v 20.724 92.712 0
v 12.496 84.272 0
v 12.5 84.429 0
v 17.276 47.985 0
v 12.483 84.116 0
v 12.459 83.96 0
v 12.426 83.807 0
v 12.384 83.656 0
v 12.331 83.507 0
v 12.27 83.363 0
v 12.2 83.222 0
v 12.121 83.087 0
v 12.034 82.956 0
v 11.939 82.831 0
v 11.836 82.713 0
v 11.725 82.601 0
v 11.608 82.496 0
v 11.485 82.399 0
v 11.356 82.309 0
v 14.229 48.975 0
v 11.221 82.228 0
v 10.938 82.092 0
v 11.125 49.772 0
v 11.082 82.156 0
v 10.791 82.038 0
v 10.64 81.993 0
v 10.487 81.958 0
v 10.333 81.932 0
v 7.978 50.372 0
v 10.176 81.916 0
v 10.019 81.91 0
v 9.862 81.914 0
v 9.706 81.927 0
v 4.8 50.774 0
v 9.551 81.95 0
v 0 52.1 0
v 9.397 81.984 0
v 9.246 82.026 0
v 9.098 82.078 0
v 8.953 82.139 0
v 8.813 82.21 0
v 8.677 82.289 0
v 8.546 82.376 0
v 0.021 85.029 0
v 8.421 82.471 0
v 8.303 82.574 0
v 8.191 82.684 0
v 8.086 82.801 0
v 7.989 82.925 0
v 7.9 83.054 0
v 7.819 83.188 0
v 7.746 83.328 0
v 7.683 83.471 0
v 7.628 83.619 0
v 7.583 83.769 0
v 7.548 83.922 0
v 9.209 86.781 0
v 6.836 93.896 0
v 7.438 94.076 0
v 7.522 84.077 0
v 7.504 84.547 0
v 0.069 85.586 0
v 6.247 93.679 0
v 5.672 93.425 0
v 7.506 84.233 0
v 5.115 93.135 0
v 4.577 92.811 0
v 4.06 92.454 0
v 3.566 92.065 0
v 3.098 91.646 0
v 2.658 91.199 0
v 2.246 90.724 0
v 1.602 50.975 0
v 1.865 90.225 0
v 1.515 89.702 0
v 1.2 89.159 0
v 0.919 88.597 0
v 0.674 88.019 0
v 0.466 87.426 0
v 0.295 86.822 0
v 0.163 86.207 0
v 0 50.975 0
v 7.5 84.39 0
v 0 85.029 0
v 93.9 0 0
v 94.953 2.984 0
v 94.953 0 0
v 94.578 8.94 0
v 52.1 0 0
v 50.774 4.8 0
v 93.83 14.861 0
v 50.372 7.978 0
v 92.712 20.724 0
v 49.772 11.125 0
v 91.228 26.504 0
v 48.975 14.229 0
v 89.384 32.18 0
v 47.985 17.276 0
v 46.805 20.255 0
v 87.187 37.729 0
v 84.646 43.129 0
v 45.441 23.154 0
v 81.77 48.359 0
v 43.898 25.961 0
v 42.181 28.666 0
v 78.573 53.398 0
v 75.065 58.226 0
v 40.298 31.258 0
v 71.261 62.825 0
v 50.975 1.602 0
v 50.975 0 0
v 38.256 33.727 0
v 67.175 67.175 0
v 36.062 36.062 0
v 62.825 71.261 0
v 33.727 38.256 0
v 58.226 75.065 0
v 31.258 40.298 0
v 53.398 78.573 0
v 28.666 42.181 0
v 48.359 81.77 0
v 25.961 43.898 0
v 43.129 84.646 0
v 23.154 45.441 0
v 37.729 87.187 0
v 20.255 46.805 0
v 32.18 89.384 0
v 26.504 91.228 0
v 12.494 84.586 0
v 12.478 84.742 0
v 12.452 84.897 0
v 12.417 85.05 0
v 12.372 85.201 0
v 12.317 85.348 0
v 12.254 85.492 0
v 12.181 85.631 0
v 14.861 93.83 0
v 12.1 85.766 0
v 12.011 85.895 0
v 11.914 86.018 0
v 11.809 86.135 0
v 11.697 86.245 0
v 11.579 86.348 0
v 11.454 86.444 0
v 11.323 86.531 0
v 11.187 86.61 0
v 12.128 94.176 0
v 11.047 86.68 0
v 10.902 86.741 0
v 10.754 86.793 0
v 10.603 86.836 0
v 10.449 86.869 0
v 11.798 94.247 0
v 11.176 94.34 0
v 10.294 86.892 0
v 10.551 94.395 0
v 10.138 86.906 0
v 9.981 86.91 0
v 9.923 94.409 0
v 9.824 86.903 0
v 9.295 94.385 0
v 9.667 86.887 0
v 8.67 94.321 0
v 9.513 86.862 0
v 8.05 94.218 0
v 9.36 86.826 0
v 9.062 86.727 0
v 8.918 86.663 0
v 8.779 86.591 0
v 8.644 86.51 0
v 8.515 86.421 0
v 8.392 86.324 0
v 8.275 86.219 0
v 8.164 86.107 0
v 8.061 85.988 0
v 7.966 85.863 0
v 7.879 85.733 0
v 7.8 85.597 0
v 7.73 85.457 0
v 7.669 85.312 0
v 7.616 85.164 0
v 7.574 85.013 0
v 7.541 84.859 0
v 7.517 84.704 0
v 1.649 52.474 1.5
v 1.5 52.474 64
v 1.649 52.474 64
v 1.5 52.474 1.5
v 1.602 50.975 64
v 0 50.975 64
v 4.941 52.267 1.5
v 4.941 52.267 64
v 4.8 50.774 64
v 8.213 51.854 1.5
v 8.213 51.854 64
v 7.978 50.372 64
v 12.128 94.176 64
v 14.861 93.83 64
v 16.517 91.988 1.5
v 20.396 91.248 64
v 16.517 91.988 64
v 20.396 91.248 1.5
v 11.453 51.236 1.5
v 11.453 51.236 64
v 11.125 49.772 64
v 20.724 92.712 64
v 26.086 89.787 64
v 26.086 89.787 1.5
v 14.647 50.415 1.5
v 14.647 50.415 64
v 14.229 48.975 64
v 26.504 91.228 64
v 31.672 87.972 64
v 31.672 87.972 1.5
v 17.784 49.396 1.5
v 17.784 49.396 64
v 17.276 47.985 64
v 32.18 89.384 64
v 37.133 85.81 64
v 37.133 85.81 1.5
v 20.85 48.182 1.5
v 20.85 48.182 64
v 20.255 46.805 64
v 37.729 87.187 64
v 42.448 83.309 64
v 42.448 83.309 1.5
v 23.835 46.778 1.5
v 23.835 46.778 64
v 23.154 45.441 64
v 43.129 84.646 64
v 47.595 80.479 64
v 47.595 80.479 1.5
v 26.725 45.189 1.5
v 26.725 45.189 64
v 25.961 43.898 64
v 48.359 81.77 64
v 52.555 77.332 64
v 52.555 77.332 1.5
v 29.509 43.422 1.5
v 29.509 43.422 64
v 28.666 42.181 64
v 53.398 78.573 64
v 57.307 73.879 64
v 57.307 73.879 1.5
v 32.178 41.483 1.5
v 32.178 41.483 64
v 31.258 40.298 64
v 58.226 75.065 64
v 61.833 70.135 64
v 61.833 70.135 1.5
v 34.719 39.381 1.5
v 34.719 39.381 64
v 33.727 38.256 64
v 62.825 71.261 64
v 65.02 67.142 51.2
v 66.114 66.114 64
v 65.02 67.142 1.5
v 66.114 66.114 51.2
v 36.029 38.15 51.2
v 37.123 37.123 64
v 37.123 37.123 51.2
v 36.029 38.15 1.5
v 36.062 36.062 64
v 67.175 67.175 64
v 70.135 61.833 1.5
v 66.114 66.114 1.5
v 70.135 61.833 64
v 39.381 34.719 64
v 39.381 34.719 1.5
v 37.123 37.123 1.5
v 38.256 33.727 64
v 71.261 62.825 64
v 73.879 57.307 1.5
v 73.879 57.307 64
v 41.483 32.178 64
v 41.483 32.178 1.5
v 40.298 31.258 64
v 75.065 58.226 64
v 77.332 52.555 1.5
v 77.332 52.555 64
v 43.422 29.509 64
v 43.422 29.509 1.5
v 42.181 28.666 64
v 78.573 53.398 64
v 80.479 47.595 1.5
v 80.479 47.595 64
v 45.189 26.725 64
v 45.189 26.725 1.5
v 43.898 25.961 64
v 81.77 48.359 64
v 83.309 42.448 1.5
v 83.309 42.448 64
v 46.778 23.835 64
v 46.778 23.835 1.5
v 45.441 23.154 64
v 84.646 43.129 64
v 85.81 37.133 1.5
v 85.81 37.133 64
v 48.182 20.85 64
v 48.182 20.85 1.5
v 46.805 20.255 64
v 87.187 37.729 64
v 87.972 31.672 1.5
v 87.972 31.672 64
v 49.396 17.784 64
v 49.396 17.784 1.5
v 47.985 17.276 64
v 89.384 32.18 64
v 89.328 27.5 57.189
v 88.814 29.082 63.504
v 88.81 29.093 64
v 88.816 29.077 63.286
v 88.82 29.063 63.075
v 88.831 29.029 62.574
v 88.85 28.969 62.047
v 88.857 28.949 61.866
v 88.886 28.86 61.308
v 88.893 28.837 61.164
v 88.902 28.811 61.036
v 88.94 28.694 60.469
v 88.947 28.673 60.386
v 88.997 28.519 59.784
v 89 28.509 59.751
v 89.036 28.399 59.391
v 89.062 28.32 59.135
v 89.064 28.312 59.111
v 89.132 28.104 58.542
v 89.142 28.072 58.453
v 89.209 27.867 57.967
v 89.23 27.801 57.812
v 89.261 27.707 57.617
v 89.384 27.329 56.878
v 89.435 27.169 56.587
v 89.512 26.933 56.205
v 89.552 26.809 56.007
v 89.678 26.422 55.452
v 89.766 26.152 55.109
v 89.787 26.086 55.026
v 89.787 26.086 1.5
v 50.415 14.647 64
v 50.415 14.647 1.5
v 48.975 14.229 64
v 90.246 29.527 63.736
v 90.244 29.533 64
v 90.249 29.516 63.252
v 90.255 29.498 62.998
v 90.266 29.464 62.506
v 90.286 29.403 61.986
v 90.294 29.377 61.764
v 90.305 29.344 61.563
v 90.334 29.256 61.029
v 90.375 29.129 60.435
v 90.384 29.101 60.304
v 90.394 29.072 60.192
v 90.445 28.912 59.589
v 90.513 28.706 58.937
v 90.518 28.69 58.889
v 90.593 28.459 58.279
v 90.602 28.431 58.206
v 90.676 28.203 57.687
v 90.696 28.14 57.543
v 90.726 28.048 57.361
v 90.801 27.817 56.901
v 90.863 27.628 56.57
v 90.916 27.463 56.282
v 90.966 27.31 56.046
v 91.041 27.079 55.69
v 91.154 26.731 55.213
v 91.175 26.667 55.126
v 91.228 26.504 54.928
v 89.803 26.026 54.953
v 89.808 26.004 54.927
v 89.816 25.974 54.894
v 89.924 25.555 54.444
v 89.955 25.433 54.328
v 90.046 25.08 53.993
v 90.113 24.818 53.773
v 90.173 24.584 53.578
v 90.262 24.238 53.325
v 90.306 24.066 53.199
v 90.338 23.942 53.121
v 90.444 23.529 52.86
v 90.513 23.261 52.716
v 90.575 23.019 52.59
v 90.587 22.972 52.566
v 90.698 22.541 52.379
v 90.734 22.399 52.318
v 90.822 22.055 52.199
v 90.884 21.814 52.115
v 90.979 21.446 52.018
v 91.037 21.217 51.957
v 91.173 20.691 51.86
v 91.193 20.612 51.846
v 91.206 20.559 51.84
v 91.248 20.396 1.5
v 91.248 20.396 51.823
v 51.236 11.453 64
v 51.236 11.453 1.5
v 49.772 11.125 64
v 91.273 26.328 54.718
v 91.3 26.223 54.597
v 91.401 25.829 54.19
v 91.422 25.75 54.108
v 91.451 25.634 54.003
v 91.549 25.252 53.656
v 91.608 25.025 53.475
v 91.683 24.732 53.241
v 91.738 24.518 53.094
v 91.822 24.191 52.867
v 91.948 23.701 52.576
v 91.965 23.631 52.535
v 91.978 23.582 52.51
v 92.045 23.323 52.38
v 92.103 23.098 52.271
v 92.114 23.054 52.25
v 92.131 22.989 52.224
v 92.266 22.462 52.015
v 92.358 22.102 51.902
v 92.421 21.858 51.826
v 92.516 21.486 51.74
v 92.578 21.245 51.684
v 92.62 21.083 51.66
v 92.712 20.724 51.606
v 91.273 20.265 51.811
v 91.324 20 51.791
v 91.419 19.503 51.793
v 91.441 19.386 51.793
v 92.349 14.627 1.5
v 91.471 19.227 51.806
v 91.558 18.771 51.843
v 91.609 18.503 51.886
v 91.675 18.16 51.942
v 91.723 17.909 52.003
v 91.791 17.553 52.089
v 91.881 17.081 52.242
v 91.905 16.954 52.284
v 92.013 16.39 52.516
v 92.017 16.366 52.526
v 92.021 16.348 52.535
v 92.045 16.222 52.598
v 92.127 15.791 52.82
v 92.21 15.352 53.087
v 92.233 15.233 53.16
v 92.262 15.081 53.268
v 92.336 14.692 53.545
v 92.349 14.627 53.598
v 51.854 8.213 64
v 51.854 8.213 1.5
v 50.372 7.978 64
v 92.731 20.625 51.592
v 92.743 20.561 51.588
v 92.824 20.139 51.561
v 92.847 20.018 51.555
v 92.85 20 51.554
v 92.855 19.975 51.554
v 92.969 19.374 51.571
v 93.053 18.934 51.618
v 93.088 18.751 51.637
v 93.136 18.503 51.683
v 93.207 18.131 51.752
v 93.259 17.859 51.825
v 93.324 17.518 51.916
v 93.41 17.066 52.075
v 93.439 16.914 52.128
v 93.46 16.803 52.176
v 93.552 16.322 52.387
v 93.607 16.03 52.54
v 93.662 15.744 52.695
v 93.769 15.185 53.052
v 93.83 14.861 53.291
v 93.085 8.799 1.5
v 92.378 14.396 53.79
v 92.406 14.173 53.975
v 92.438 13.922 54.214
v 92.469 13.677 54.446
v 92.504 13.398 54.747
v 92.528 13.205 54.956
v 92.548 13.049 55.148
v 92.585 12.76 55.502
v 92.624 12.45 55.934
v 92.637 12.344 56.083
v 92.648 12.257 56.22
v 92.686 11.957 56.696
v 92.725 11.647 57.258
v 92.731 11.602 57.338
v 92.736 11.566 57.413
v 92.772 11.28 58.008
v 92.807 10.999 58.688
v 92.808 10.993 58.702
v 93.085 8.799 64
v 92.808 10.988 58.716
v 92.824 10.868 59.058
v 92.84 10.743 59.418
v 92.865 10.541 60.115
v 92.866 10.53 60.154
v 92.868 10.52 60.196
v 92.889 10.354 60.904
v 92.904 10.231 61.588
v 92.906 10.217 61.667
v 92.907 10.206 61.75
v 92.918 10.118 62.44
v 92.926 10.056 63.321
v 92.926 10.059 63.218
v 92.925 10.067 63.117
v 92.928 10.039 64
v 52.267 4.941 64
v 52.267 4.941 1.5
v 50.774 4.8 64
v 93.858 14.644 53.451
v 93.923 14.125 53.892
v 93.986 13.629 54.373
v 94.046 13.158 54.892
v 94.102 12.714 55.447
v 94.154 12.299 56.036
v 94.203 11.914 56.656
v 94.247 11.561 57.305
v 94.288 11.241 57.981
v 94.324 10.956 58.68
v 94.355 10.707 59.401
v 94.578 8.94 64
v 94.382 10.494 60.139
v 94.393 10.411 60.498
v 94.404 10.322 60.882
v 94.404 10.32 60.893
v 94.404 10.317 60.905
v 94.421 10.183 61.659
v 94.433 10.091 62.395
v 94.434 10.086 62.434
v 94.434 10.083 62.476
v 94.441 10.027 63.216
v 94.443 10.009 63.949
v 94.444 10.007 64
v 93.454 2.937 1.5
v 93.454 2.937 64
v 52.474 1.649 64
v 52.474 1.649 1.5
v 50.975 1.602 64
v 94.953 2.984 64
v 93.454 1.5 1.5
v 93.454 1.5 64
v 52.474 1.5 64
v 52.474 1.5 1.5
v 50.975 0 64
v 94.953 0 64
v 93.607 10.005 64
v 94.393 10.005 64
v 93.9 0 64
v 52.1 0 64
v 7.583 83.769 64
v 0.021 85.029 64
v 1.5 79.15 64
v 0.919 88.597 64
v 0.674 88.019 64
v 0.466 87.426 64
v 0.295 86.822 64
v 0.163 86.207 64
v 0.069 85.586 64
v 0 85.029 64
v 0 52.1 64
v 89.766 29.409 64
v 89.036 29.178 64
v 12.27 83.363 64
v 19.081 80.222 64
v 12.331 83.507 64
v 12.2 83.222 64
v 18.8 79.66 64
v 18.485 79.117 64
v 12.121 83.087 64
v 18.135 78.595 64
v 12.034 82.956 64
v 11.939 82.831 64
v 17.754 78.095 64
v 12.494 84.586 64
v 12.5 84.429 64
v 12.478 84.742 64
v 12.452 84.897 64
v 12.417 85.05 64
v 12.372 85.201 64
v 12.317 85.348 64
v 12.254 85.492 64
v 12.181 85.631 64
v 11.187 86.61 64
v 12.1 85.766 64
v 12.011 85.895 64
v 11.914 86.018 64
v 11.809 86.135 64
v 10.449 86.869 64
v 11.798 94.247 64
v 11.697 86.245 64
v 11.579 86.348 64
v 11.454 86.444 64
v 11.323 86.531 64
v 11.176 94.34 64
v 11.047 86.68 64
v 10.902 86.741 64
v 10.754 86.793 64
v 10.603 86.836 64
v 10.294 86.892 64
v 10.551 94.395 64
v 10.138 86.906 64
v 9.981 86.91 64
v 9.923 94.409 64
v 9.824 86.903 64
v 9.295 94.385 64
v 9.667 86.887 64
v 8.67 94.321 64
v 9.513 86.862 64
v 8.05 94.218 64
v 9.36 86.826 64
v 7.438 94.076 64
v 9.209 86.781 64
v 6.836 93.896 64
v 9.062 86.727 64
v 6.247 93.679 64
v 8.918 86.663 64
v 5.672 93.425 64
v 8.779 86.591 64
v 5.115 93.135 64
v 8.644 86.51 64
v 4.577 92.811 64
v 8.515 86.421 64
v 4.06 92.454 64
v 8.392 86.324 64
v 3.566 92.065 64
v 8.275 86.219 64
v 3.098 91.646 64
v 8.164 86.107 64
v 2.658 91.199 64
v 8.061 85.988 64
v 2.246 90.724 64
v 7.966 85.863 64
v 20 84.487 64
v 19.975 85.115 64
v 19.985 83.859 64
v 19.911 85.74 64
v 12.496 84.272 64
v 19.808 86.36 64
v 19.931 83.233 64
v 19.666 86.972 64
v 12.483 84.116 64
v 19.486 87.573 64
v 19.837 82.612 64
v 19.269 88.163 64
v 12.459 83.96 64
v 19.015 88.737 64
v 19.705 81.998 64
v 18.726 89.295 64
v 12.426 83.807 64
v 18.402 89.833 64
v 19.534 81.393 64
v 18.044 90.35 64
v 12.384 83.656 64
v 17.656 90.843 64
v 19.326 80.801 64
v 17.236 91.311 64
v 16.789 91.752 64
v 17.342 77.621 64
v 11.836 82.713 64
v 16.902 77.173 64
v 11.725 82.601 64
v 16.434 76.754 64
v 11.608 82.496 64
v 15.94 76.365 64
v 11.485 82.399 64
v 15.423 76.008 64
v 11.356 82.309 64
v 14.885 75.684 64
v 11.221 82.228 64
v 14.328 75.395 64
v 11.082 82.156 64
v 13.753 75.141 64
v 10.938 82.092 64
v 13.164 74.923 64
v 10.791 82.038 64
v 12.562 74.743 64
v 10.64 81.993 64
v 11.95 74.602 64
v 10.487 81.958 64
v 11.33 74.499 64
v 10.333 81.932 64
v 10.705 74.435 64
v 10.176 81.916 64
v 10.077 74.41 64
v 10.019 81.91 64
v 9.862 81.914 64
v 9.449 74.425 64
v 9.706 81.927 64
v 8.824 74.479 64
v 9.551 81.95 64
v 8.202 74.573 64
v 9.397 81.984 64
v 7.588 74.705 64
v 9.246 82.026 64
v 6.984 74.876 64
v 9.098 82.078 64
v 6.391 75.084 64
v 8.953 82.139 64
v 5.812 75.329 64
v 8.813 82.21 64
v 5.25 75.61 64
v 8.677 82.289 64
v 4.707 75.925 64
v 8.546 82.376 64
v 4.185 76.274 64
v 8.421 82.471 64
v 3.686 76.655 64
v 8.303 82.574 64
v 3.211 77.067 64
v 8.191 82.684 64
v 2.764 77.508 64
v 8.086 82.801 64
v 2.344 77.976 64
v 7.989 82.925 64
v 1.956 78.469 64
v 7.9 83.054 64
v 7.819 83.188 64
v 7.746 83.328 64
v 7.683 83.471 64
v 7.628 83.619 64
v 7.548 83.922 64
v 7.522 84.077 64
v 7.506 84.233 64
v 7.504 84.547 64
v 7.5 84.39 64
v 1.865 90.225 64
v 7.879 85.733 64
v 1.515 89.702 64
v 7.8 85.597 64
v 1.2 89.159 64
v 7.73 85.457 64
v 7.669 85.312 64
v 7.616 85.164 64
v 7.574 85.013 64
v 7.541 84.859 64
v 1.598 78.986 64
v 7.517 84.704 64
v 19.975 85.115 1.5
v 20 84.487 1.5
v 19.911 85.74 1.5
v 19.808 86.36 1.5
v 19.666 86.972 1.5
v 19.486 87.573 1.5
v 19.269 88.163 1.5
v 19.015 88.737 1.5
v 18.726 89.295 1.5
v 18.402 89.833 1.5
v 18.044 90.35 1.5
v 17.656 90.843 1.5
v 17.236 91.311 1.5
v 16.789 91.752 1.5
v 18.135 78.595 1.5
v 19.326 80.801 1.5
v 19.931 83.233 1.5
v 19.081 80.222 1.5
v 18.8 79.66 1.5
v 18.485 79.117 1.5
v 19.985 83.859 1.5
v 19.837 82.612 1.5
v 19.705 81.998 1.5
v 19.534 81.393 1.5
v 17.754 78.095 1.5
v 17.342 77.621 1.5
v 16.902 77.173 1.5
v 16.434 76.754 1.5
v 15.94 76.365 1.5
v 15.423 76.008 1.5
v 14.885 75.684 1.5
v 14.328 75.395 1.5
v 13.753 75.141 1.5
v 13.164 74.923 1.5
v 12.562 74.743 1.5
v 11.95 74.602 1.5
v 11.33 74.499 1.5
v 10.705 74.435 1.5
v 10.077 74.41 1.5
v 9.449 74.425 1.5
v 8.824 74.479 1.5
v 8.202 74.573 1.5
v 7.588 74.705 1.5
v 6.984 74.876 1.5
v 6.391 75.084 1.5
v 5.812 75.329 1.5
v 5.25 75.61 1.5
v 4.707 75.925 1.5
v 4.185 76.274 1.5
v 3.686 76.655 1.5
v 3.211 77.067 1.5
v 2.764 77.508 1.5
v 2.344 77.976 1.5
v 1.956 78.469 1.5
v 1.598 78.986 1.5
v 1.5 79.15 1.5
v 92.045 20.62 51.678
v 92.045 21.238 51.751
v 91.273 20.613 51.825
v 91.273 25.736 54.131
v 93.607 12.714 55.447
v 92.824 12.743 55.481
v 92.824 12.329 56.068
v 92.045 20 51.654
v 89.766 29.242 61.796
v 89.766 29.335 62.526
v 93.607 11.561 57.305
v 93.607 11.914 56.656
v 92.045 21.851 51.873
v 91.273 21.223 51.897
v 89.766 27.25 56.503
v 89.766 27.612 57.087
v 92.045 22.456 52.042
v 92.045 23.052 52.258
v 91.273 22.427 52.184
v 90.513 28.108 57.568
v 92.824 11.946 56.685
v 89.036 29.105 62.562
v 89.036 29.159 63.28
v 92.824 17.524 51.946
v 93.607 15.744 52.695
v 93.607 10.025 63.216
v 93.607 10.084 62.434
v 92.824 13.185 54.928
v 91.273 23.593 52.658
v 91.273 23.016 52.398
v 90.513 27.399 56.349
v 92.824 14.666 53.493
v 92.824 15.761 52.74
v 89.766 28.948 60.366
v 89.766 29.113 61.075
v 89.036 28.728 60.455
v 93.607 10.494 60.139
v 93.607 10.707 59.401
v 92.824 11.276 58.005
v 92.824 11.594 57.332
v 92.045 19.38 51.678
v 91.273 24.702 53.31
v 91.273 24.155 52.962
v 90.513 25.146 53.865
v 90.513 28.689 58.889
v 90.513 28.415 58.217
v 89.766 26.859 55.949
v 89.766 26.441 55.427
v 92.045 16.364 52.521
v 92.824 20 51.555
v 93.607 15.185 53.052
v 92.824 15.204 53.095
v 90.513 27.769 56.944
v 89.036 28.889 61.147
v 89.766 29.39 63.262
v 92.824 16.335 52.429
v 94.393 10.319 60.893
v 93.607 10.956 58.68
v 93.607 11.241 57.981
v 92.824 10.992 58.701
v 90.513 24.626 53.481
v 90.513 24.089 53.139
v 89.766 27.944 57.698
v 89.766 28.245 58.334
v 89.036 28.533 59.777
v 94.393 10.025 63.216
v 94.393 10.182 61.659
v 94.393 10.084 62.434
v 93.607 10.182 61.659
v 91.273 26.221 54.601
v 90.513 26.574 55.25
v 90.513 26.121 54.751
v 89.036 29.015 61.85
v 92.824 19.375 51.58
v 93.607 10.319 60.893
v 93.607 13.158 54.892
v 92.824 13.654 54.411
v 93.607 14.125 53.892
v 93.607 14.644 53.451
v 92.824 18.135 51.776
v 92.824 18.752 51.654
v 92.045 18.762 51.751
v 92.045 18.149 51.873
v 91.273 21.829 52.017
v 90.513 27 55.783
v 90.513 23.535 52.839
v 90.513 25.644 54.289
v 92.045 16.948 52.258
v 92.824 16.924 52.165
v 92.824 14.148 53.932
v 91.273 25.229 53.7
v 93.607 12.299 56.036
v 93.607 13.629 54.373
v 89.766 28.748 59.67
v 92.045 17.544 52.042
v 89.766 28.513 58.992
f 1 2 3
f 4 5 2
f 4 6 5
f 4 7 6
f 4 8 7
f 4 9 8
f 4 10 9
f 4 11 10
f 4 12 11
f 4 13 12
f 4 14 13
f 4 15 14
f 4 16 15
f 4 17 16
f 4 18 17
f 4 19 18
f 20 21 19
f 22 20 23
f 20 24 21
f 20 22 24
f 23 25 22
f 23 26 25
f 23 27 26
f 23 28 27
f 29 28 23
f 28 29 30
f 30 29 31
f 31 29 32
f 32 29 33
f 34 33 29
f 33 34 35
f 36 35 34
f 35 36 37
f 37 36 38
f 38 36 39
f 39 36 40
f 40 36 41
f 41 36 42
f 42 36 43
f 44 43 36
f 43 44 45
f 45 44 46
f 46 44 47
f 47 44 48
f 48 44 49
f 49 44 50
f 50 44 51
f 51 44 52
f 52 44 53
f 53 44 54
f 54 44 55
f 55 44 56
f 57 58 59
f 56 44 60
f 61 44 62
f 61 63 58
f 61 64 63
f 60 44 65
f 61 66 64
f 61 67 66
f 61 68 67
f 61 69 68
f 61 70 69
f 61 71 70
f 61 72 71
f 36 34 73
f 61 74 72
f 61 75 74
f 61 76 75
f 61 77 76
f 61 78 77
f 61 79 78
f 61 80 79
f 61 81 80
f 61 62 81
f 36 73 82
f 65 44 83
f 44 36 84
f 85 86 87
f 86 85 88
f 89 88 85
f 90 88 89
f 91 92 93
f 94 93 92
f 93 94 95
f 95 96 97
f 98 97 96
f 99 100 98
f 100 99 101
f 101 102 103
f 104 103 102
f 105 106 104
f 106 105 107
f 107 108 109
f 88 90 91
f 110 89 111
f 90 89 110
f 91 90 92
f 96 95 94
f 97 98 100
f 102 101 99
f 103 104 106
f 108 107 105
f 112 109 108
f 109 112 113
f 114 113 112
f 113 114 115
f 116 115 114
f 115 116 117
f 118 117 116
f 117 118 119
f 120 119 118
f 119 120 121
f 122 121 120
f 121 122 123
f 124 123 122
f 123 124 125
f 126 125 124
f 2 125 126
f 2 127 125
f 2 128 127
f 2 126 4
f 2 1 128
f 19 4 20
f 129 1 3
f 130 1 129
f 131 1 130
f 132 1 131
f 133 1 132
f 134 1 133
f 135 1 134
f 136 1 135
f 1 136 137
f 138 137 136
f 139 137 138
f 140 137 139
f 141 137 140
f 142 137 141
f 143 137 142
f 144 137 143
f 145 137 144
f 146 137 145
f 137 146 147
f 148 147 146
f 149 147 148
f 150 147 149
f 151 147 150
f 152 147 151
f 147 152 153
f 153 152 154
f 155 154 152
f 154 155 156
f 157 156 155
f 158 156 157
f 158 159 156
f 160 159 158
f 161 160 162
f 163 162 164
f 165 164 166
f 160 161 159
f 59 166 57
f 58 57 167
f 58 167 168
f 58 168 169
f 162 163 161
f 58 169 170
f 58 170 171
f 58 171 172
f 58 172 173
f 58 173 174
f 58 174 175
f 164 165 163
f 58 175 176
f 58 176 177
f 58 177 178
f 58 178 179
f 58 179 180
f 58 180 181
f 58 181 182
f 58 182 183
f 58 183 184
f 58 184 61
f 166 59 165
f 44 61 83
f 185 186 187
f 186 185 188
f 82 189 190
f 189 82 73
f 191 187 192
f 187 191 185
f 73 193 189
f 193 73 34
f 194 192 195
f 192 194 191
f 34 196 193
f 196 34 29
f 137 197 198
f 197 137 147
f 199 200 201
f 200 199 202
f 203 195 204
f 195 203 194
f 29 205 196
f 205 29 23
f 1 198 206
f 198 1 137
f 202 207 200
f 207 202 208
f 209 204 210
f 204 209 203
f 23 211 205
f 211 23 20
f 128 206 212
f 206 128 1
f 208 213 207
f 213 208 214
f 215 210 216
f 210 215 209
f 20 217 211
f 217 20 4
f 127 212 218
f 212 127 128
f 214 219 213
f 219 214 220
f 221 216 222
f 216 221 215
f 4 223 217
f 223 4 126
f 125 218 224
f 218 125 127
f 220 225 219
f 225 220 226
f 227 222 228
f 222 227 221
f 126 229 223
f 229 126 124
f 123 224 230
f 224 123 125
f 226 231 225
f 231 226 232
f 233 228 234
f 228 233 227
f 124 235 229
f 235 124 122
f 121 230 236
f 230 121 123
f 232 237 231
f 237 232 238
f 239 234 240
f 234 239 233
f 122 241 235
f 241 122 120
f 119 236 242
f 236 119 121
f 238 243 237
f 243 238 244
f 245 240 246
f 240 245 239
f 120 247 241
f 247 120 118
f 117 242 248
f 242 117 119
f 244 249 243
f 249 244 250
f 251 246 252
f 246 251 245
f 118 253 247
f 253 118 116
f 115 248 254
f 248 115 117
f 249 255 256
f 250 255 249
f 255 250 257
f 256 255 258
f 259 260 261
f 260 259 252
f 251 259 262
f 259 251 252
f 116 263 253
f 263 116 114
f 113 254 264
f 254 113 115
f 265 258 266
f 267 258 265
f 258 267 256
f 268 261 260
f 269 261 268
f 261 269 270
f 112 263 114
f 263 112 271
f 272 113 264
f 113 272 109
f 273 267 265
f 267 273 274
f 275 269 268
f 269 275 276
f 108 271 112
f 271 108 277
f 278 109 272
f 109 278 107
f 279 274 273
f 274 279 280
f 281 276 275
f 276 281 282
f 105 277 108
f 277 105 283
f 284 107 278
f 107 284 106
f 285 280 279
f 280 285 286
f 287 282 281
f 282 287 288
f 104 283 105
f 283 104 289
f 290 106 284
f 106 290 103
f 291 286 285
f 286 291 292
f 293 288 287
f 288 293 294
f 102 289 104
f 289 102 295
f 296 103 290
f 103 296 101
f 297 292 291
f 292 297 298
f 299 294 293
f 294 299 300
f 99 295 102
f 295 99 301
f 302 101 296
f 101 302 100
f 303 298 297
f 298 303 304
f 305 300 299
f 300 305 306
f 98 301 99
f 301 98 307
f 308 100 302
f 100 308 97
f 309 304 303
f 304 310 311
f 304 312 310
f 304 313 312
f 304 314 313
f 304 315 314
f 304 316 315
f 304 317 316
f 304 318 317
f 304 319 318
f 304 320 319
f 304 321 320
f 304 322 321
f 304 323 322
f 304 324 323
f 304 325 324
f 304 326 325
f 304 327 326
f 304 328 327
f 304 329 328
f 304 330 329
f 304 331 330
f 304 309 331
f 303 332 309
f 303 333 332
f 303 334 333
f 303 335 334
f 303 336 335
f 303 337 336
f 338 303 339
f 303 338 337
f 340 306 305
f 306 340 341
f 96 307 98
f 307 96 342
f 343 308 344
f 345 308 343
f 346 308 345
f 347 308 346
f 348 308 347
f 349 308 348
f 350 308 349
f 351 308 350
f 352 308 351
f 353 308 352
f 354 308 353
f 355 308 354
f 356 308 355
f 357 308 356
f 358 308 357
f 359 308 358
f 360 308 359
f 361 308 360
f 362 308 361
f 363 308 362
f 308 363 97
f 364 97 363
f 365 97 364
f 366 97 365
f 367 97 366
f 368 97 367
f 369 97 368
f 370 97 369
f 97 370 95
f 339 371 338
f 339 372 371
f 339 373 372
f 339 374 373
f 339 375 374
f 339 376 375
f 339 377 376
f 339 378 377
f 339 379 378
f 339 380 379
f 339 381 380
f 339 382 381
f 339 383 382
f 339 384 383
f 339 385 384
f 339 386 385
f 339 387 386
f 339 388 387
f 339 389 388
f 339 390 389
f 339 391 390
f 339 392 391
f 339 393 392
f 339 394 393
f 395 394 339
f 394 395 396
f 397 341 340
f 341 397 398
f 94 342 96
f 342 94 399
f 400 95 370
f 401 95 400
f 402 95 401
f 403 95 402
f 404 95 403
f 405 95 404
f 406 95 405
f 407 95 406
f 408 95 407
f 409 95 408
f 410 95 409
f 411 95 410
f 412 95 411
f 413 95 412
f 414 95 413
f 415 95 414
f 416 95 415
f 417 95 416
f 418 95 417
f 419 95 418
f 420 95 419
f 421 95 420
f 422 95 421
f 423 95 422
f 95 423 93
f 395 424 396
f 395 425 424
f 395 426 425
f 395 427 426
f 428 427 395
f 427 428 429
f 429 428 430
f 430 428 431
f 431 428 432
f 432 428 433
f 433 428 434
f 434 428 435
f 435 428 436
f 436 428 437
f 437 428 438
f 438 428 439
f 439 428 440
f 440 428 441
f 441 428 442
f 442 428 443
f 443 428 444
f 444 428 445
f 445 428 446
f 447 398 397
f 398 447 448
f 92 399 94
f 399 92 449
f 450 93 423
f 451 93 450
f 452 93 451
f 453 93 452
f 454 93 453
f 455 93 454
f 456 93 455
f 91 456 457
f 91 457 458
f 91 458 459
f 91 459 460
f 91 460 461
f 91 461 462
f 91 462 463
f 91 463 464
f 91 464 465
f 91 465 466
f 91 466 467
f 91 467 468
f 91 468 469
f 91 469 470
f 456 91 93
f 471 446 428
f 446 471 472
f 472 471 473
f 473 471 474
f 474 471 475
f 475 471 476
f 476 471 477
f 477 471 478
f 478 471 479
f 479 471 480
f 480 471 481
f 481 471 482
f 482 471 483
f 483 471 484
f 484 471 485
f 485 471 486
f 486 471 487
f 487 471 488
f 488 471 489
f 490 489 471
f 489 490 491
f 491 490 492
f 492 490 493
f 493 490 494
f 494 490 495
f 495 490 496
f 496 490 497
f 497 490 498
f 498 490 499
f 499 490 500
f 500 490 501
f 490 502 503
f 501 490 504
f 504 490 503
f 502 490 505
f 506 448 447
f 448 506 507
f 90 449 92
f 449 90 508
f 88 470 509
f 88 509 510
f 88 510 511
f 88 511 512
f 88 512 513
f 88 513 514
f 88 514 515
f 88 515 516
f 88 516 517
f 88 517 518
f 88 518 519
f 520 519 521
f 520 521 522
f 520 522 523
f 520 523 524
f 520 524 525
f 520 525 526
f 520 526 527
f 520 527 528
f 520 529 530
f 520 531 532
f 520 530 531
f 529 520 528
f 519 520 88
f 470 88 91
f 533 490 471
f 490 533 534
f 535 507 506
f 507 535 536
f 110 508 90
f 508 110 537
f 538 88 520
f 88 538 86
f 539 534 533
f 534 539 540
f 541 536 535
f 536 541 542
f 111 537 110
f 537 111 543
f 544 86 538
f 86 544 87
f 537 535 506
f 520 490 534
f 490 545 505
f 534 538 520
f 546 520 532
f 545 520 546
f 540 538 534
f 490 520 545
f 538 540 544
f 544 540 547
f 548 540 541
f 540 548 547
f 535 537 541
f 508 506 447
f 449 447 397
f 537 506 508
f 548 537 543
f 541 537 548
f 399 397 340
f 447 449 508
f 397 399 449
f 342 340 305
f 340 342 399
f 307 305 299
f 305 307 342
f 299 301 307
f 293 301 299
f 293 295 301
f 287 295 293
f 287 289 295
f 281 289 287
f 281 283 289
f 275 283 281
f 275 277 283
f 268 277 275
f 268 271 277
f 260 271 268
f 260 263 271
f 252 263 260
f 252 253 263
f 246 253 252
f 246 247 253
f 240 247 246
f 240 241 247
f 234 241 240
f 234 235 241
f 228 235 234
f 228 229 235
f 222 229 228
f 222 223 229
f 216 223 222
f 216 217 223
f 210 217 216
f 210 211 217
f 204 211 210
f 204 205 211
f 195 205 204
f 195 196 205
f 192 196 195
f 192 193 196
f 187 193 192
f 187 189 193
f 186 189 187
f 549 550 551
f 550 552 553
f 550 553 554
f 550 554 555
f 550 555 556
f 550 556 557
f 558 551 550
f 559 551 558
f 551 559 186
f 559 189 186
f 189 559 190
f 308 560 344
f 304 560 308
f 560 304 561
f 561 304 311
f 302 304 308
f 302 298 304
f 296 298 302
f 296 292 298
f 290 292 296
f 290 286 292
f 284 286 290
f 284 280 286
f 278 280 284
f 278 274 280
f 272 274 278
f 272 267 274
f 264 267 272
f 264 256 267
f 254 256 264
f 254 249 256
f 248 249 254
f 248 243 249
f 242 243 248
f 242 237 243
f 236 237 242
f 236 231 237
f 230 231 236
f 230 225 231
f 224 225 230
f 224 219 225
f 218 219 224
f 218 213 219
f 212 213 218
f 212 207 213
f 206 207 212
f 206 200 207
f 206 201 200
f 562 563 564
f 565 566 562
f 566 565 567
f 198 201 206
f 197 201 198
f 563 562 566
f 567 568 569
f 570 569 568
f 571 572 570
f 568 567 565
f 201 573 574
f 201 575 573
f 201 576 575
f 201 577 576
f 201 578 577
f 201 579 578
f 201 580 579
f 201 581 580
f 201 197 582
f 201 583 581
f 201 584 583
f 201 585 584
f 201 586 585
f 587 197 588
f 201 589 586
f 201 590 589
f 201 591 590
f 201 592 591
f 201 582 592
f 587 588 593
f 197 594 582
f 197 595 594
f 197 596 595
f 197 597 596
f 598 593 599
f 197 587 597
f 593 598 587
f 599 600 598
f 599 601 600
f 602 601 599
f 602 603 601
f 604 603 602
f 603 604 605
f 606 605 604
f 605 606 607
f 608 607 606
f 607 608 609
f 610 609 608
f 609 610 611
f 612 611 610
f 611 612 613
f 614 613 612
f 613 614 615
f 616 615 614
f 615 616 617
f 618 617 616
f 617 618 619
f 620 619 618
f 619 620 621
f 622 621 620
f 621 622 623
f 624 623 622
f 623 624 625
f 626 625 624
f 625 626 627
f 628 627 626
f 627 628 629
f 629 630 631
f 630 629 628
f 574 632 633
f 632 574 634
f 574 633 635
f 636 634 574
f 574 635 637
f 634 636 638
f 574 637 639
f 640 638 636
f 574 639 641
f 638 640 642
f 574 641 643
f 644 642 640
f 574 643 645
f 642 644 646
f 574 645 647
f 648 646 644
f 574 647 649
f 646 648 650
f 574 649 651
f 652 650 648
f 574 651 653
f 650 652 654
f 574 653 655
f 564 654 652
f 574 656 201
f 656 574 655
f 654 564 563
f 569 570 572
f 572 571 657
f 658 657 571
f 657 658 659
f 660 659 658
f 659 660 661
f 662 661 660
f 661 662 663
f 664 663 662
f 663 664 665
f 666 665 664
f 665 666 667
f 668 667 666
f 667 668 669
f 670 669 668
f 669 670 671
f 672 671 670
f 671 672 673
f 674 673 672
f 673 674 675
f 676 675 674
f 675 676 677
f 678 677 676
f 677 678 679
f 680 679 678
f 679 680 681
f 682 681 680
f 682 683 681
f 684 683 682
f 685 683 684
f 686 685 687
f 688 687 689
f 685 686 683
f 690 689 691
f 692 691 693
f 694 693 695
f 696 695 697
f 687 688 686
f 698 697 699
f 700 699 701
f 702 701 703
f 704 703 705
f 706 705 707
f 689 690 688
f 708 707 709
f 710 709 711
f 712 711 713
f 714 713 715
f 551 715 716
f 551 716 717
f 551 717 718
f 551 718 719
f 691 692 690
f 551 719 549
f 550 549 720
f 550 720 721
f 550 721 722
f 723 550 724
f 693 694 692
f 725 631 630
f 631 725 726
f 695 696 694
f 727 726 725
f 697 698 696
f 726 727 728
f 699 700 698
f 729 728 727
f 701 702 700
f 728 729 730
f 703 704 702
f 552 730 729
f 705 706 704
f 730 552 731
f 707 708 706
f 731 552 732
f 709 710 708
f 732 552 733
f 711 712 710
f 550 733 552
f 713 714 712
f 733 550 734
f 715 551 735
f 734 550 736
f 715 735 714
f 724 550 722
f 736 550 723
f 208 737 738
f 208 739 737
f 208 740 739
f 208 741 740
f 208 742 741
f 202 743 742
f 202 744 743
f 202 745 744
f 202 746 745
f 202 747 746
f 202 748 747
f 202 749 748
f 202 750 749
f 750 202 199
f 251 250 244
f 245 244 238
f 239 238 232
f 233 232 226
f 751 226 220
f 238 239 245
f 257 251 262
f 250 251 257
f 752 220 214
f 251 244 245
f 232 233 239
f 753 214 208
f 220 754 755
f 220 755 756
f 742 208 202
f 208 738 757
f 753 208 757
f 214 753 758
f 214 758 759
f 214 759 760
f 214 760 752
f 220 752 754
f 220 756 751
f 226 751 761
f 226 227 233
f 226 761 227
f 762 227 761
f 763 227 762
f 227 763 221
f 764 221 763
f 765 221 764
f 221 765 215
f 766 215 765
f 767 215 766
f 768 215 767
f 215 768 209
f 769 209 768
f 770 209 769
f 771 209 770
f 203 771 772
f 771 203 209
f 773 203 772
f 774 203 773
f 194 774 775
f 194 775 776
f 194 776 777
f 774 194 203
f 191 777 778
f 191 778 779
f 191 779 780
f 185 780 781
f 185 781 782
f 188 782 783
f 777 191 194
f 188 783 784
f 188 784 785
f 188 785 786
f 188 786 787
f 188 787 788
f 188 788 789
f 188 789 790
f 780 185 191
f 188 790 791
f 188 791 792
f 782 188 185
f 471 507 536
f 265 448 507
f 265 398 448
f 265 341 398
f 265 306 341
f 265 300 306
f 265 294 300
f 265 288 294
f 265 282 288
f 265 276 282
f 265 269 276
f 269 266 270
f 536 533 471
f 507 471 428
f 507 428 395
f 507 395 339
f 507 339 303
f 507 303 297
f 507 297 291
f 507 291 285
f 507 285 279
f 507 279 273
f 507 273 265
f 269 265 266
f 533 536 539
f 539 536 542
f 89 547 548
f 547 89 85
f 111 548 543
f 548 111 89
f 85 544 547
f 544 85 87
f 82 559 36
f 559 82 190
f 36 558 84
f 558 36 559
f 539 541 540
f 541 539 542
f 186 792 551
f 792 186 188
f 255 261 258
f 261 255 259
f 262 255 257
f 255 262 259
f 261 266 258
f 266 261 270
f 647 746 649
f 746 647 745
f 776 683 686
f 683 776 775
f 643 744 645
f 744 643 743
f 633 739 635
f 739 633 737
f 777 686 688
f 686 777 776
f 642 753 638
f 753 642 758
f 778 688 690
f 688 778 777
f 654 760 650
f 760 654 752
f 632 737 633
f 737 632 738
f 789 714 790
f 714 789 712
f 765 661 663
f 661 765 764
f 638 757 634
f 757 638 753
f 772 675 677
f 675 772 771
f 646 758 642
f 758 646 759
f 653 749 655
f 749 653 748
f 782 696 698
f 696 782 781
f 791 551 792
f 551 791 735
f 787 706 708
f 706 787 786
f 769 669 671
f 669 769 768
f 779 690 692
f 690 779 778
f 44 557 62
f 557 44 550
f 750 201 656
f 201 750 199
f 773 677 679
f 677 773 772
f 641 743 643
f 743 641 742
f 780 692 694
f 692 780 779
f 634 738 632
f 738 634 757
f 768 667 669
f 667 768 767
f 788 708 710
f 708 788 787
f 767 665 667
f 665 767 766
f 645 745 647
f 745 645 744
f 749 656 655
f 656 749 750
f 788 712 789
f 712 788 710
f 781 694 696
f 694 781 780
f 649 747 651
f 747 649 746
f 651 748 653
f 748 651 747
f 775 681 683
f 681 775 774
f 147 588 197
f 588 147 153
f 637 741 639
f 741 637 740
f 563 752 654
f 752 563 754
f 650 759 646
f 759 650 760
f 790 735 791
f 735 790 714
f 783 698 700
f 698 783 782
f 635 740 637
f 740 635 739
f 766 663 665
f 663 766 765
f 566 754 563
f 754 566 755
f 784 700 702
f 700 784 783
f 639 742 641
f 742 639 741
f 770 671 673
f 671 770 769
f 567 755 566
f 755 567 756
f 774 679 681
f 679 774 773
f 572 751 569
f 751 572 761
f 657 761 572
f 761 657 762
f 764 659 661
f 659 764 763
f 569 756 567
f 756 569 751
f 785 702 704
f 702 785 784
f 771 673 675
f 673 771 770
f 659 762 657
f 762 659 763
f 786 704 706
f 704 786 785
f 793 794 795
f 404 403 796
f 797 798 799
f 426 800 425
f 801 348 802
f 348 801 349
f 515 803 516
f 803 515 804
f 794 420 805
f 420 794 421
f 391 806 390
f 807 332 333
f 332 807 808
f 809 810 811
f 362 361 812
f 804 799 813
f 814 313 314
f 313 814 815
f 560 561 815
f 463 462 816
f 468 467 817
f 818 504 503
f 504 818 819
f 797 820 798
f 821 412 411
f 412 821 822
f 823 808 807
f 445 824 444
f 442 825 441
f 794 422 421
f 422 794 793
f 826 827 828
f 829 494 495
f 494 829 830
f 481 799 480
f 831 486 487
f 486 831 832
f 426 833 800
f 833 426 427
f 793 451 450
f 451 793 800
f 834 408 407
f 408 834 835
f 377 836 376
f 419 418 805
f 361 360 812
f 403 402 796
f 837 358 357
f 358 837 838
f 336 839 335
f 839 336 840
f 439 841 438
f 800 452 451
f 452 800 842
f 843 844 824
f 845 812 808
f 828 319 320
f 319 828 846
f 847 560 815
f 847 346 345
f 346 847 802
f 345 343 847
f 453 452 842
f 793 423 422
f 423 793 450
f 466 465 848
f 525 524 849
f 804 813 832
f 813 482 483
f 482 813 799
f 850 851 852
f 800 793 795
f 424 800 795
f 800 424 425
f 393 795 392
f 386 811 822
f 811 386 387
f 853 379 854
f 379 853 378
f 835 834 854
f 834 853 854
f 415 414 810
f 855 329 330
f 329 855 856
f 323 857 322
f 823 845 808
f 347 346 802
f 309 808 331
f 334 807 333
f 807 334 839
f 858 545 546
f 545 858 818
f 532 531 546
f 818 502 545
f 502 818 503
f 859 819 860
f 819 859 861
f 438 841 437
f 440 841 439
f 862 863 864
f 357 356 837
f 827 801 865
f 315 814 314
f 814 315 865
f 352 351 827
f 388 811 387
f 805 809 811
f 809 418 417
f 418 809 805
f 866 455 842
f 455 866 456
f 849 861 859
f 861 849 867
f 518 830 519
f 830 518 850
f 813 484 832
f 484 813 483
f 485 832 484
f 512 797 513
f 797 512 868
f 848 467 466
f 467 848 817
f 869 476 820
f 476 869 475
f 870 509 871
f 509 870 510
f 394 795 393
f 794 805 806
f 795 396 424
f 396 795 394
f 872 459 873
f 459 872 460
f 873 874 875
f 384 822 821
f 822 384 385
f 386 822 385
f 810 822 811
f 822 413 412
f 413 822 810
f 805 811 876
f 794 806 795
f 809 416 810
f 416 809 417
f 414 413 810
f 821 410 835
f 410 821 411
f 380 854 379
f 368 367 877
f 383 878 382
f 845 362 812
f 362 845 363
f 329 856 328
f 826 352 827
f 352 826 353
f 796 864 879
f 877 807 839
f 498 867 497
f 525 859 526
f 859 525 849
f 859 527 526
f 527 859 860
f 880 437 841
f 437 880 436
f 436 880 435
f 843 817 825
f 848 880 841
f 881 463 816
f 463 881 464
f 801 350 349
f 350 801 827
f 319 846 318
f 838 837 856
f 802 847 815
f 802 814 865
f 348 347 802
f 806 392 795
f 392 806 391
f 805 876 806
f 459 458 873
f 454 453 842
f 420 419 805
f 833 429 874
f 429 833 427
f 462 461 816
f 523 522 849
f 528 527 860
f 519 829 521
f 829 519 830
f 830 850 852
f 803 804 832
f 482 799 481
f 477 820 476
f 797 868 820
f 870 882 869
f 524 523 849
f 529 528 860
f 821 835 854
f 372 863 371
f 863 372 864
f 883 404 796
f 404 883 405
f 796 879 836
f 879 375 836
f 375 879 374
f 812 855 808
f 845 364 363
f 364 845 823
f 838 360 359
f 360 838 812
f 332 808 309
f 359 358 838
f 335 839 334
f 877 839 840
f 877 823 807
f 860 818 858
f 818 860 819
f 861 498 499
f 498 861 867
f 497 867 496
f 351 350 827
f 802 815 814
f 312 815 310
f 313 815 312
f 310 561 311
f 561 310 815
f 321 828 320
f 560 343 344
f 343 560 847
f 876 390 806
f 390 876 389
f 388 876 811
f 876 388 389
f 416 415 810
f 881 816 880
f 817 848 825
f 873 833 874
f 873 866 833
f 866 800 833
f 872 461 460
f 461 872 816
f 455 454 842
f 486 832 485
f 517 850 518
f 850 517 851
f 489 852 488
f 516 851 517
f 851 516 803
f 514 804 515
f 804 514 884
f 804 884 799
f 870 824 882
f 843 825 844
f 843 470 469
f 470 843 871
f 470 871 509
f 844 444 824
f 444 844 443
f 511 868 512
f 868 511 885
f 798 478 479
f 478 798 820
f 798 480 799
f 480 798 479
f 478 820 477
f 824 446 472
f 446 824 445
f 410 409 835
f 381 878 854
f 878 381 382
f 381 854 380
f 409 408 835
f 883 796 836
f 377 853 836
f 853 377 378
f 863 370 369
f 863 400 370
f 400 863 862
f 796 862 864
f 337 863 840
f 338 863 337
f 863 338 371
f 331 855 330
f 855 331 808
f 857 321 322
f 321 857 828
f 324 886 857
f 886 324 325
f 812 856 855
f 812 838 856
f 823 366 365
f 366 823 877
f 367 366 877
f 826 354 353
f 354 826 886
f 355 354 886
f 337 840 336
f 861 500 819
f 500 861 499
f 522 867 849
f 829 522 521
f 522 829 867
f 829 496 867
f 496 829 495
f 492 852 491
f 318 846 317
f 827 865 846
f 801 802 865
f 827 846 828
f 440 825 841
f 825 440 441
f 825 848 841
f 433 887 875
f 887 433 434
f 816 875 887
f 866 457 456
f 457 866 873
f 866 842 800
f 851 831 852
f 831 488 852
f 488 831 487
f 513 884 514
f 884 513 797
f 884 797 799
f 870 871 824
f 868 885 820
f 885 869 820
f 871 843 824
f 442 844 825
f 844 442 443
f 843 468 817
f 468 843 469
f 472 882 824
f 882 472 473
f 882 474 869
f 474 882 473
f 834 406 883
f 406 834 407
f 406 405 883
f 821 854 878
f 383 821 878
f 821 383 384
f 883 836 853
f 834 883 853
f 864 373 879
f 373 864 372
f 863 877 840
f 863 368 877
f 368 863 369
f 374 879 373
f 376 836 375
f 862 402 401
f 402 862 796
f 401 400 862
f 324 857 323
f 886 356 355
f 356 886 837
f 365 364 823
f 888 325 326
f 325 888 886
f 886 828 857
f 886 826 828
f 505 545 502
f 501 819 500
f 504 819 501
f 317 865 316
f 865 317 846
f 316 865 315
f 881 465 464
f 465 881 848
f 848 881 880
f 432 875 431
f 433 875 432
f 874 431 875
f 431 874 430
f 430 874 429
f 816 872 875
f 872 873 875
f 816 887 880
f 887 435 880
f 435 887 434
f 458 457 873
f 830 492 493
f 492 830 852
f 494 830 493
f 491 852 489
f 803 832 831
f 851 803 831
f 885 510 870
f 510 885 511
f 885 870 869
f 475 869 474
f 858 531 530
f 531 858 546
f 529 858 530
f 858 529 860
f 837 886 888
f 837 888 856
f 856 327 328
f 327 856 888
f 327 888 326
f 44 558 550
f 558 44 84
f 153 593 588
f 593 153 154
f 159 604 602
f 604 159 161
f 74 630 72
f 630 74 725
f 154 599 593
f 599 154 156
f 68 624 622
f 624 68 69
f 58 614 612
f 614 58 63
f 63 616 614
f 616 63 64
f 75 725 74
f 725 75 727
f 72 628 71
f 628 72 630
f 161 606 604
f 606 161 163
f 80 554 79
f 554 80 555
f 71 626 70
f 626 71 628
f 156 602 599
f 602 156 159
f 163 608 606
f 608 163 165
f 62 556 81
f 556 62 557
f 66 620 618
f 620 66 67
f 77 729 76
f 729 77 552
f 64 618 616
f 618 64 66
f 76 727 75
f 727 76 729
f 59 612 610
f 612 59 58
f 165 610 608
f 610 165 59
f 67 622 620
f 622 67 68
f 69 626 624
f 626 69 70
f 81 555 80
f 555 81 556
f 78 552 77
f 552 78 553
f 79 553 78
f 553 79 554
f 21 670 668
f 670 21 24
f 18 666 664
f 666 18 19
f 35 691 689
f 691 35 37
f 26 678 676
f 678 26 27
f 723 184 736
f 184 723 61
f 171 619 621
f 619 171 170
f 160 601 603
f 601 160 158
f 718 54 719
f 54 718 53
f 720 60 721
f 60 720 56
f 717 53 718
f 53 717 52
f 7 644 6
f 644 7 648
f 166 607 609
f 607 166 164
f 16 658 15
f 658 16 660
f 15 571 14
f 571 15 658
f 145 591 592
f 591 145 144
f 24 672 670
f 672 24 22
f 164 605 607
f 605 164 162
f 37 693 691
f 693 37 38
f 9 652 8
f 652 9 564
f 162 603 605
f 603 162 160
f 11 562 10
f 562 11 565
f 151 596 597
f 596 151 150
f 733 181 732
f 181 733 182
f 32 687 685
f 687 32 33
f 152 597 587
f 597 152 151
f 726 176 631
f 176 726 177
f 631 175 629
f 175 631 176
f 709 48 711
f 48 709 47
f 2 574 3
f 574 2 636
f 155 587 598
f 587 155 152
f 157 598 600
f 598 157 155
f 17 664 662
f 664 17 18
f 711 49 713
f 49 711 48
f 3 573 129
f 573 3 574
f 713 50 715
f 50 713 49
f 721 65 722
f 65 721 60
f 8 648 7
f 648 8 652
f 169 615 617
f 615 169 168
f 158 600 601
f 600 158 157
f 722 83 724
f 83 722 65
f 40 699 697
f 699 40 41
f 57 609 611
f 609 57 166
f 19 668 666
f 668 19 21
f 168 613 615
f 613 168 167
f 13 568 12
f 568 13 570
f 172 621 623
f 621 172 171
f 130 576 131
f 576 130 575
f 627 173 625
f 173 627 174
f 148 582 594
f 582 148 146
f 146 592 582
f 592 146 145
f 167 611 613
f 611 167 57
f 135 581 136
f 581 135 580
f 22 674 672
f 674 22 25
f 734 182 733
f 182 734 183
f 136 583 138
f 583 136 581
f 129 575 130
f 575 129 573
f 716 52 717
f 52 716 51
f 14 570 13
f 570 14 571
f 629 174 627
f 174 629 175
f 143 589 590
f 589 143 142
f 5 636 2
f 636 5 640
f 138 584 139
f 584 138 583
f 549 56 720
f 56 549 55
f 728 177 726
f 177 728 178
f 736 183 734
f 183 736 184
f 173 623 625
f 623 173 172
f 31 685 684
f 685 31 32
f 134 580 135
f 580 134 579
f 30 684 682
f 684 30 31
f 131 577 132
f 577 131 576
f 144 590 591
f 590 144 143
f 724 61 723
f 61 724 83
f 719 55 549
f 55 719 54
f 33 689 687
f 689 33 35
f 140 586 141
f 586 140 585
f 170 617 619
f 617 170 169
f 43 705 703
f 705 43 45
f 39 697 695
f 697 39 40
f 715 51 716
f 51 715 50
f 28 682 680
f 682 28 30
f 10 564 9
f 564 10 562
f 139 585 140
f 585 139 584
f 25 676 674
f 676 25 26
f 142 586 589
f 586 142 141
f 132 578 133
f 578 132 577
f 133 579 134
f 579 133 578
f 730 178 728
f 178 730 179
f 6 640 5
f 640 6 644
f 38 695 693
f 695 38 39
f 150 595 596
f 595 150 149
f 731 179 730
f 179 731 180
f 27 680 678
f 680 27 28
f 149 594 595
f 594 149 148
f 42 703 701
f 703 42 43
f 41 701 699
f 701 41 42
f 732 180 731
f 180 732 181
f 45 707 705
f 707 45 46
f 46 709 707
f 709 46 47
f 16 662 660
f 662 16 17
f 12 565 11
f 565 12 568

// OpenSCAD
// Global parameters, specific for each spool brand
/*******************
*    ICE 0.75kg    *
* inner hole 54mm  *
*******************/
// Full size of spool
//spool_diameter=199;
// Inside height
//spool_height=50;
// Rack width = spool outside diameter - spool inside diameter
//rack_width=41;


/*******************
*    Sunlu 1kg     *
* inner hole 73mm  *
*******************/
// Full size of spool
//spool_diameter=200;
// Inside height
//spool_height=54;
// Rack width = spool outside diameter - spool inside diameter
//rack_width=61;


/*******************
*   Verbatim 1kg   *
* inner hole 51mm  *
*******************/
// Full size of spool
//spool_diameter=200;
// Inside height
//spool_height=61;
// Rack width = spool outside diameter - spool inside diameter
//rack_width=47;


/*******************
*      BQ 1kg      *
* inner hole 53mm  *
*******************/
// Full size of spool
//spool_diameter=190;
// Inside height
//spool_height=65;
// Rack width = spool outside diameter - spool inside diameter
//rack_width=44;

/* [Spool and Rack] */
// Full size of spool
spool_diameter=190;
// Inside height
spool_height=65;
// rack width = spool outside diameter - spool inside diameter
rack_width=44;

// Custom parameters, according to your needs
// Number of racks
rack_count=4; // [2,3,4,5,6]
// Number of separators in each rack
spacer_count=1; // [0,1,2,3,4]
// Spacer height (percent of rack height)
spacer_height=0.8; // [0:0.1:1]
// Number of floors
floor_count=1; // [1,2]
// Print only one rack ?
single_print = 1; // [0:false, 1:true]
// Mirror each rack
mirror_rack = 0;  // [0:false, 1:true]

/* [Handle and Hinge] */
// Handle (hole)
// Size of hole handle (0 = disabled)
handle_hole_size=20;

// Handle (grip)
// Size of grip handle (0 = disabled)
handle_grip_size=0; // 10
// Grip height (percent of rack height)
handle_grip_height=0.5; // [0:0.1:1]
// Grip width (percent of grip size)
handle_grip_width=0.8; // [0:0.1:1]

// Hinge
hinge_width=20;
drill_width=5; // [1:0.5:6]

/* [Advanced] */
// Global thickness
wall_thickness=1.5;
// Exploded view (recommended for printing)
explode_margin=4;

/* [Hidden] */
//$fa = 0.01; $fs = 0.01;
// Resolution
$fn = 100; // [1:100]

// Computed constants
spool_radius = spool_diameter/2;
hinge_radius = hinge_width/2;
hinge_angle = asin(hinge_radius/(spool_radius-hinge_radius));

// older versions of OpenSCAD do not support "angle" parameter for rotate_extrude
// this module provides that capability even when using older versions (such as thingiverse customizer)
module rotate_extrude2(angle=360, convexity=2, size=1000) {

    module angle_cut(angle=90, size=1000) {
        x = size*cos(angle/2);
        y = size*sin(angle/2);
        translate([0,0,-size])
        linear_extrude(2*size) polygon([[0,0],[x,y],[x,size],[-size,size],[-size,-size],[x,-size],[x,-y]]);
    }

    // support for angle parameter in rotate_extrude was added after release 2015.03
    // Thingiverse customizer is still on 2015.03
    angleSupport = (version_num() > 20150399) ? true*false : false; // Next openscad releases after 2015.03.xx will have support angle parameter
    // Using angle parameter when possible provides huge speed boost, avoids a difference operation

    if (angleSupport) {
        rotate_extrude(angle=angle,convexity=convexity)
            children();
    } else {
        rotate([0,0,angle/2]) difference() {
            rotate_extrude(convexity=convexity)
                children();
            angle_cut(angle, size);
        }
    }
}


module drill(width_1=10, width_2=10, height=10, hole=5) {
    difference() {
        translate ([0, 0, 0]) rotate ([-90, 0, 0]) cylinder (h=height, r1=width_1/2, r2=width_2/2);
        translate ([0, -0.1, 0]) rotate ([-90, 0, 0]) cylinder (h=height+0.2, r=hole/2);
    }
}

module sub_rack() {
    // Main rack
    rotate_extrude2(angle = 360/rack_count, convexity = 2, size=spool_radius+2)
    translate([spool_radius-rack_width, 0, 0])
    polygon(points=[
        [0,0],
        [0,(spool_height-1)/floor_count],
        [wall_thickness,(spool_height-1)/floor_count],
        [wall_thickness,wall_thickness],

        [rack_width-wall_thickness,wall_thickness],
        [rack_width-wall_thickness,(spool_height-1)/floor_count],
        [rack_width,(spool_height-1)/floor_count],
        [rack_width,0]]);
    // Wall
    if (rack_count>1) {
        // First
        translate([spool_radius-rack_width+1.1, 0, 0])
        cube([rack_width-2.2, wall_thickness, (spool_height-1)/floor_count]);
        // Second
        rotate([0, 0, 360/rack_count])
        translate([spool_radius-rack_width+1.1, -wall_thickness, 0])
        cube([rack_width-2, wall_thickness, (spool_height-1)/floor_count]);
    }
    // Spacer
    if (spacer_count>0) {
        for(spacer_nr = [0 : spacer_count-1]) {
            rotate([0, 0, (360/rack_count)/(spacer_count+1)*(spacer_nr+1)])
            translate([spool_radius-rack_width+1.1, 0, 0])
            cube([rack_width-2.2, wall_thickness, (spool_height-1)/floor_count*spacer_height]);
        }
    }
}

module handle_hole() {
    rotate([0, 90, 0])
    scale([1.25,1,1.25])
    sphere (r=handle_hole_size/2);
}

module handle_grip() {
    cube([handle_grip_size*2/3, handle_grip_size*2/3*handle_grip_width, (spool_height-1)/floor_count*handle_grip_height]);
    translate([handle_grip_size*2/3, (handle_grip_size*2/3*handle_grip_width)/2, 0])
    scale([1,handle_grip_width,1])
    cylinder(h=(spool_height-1)/floor_count*handle_grip_height, r=handle_grip_size*0.66/2);
}

module rack() {
    union() {
        difference() {
            // Main rack
            sub_rack();

            // Handle (hole)
            translate([spool_radius-1, handle_hole_size, (spool_height-1)/floor_count])
            handle_hole();

            // Hinge, drill hole
            rotate([0, 0, 360/rack_count-hinge_angle])
            translate ([spool_radius-hinge_radius, 0, -1])
            rotate([90, 0, 0])
            drill(width_1=hinge_width, width_2=hinge_width, height=(spool_height-1)/floor_count+2, hole=0);

            // Hinge, round corner
            rotate([0, 0, 360/rack_count-hinge_angle])
            translate ([spool_radius-hinge_radius, 0, -1])
            cube([hinge_width, hinge_width, (spool_height-1)/floor_count+2]);

            rotate([0, 0, 360/rack_count-wall_thickness])
            translate ([spool_radius-hinge_radius, 0, -1])
            cube([hinge_width/2, wall_thickness+1, (spool_height-1)/floor_count+2]);
        }

        // Handle (grip)
        translate([spool_radius-1-wall_thickness, wall_thickness, 0])
        handle_grip();

        // Hinge
        rotate([0, 0, 360/rack_count-hinge_angle])
        translate ([spool_radius-hinge_radius, 0, 0])
        rotate([90, 0, 0])
        drill(width_1=hinge_width, width_2=hinge_width, height=(spool_height-1)/floor_count, hole=drill_width);
    }
}

if (single_print) {
        mirror ([mirror_rack, 0, 0])
        rack();
} else {
    for (floor_nr = [0 : floor_count-1]) {
        for(rack_nr = [0 : rack_count-1]) {
            mirror ([mirror_rack, 0, 0])
            rotate([0, 0, 360/rack_count*rack_nr])
            translate([explode_margin/2, explode_margin/2, (spool_height-1)/floor_count*floor_nr+floor_nr*explode_margin])
                rack();
        }
    }
}
